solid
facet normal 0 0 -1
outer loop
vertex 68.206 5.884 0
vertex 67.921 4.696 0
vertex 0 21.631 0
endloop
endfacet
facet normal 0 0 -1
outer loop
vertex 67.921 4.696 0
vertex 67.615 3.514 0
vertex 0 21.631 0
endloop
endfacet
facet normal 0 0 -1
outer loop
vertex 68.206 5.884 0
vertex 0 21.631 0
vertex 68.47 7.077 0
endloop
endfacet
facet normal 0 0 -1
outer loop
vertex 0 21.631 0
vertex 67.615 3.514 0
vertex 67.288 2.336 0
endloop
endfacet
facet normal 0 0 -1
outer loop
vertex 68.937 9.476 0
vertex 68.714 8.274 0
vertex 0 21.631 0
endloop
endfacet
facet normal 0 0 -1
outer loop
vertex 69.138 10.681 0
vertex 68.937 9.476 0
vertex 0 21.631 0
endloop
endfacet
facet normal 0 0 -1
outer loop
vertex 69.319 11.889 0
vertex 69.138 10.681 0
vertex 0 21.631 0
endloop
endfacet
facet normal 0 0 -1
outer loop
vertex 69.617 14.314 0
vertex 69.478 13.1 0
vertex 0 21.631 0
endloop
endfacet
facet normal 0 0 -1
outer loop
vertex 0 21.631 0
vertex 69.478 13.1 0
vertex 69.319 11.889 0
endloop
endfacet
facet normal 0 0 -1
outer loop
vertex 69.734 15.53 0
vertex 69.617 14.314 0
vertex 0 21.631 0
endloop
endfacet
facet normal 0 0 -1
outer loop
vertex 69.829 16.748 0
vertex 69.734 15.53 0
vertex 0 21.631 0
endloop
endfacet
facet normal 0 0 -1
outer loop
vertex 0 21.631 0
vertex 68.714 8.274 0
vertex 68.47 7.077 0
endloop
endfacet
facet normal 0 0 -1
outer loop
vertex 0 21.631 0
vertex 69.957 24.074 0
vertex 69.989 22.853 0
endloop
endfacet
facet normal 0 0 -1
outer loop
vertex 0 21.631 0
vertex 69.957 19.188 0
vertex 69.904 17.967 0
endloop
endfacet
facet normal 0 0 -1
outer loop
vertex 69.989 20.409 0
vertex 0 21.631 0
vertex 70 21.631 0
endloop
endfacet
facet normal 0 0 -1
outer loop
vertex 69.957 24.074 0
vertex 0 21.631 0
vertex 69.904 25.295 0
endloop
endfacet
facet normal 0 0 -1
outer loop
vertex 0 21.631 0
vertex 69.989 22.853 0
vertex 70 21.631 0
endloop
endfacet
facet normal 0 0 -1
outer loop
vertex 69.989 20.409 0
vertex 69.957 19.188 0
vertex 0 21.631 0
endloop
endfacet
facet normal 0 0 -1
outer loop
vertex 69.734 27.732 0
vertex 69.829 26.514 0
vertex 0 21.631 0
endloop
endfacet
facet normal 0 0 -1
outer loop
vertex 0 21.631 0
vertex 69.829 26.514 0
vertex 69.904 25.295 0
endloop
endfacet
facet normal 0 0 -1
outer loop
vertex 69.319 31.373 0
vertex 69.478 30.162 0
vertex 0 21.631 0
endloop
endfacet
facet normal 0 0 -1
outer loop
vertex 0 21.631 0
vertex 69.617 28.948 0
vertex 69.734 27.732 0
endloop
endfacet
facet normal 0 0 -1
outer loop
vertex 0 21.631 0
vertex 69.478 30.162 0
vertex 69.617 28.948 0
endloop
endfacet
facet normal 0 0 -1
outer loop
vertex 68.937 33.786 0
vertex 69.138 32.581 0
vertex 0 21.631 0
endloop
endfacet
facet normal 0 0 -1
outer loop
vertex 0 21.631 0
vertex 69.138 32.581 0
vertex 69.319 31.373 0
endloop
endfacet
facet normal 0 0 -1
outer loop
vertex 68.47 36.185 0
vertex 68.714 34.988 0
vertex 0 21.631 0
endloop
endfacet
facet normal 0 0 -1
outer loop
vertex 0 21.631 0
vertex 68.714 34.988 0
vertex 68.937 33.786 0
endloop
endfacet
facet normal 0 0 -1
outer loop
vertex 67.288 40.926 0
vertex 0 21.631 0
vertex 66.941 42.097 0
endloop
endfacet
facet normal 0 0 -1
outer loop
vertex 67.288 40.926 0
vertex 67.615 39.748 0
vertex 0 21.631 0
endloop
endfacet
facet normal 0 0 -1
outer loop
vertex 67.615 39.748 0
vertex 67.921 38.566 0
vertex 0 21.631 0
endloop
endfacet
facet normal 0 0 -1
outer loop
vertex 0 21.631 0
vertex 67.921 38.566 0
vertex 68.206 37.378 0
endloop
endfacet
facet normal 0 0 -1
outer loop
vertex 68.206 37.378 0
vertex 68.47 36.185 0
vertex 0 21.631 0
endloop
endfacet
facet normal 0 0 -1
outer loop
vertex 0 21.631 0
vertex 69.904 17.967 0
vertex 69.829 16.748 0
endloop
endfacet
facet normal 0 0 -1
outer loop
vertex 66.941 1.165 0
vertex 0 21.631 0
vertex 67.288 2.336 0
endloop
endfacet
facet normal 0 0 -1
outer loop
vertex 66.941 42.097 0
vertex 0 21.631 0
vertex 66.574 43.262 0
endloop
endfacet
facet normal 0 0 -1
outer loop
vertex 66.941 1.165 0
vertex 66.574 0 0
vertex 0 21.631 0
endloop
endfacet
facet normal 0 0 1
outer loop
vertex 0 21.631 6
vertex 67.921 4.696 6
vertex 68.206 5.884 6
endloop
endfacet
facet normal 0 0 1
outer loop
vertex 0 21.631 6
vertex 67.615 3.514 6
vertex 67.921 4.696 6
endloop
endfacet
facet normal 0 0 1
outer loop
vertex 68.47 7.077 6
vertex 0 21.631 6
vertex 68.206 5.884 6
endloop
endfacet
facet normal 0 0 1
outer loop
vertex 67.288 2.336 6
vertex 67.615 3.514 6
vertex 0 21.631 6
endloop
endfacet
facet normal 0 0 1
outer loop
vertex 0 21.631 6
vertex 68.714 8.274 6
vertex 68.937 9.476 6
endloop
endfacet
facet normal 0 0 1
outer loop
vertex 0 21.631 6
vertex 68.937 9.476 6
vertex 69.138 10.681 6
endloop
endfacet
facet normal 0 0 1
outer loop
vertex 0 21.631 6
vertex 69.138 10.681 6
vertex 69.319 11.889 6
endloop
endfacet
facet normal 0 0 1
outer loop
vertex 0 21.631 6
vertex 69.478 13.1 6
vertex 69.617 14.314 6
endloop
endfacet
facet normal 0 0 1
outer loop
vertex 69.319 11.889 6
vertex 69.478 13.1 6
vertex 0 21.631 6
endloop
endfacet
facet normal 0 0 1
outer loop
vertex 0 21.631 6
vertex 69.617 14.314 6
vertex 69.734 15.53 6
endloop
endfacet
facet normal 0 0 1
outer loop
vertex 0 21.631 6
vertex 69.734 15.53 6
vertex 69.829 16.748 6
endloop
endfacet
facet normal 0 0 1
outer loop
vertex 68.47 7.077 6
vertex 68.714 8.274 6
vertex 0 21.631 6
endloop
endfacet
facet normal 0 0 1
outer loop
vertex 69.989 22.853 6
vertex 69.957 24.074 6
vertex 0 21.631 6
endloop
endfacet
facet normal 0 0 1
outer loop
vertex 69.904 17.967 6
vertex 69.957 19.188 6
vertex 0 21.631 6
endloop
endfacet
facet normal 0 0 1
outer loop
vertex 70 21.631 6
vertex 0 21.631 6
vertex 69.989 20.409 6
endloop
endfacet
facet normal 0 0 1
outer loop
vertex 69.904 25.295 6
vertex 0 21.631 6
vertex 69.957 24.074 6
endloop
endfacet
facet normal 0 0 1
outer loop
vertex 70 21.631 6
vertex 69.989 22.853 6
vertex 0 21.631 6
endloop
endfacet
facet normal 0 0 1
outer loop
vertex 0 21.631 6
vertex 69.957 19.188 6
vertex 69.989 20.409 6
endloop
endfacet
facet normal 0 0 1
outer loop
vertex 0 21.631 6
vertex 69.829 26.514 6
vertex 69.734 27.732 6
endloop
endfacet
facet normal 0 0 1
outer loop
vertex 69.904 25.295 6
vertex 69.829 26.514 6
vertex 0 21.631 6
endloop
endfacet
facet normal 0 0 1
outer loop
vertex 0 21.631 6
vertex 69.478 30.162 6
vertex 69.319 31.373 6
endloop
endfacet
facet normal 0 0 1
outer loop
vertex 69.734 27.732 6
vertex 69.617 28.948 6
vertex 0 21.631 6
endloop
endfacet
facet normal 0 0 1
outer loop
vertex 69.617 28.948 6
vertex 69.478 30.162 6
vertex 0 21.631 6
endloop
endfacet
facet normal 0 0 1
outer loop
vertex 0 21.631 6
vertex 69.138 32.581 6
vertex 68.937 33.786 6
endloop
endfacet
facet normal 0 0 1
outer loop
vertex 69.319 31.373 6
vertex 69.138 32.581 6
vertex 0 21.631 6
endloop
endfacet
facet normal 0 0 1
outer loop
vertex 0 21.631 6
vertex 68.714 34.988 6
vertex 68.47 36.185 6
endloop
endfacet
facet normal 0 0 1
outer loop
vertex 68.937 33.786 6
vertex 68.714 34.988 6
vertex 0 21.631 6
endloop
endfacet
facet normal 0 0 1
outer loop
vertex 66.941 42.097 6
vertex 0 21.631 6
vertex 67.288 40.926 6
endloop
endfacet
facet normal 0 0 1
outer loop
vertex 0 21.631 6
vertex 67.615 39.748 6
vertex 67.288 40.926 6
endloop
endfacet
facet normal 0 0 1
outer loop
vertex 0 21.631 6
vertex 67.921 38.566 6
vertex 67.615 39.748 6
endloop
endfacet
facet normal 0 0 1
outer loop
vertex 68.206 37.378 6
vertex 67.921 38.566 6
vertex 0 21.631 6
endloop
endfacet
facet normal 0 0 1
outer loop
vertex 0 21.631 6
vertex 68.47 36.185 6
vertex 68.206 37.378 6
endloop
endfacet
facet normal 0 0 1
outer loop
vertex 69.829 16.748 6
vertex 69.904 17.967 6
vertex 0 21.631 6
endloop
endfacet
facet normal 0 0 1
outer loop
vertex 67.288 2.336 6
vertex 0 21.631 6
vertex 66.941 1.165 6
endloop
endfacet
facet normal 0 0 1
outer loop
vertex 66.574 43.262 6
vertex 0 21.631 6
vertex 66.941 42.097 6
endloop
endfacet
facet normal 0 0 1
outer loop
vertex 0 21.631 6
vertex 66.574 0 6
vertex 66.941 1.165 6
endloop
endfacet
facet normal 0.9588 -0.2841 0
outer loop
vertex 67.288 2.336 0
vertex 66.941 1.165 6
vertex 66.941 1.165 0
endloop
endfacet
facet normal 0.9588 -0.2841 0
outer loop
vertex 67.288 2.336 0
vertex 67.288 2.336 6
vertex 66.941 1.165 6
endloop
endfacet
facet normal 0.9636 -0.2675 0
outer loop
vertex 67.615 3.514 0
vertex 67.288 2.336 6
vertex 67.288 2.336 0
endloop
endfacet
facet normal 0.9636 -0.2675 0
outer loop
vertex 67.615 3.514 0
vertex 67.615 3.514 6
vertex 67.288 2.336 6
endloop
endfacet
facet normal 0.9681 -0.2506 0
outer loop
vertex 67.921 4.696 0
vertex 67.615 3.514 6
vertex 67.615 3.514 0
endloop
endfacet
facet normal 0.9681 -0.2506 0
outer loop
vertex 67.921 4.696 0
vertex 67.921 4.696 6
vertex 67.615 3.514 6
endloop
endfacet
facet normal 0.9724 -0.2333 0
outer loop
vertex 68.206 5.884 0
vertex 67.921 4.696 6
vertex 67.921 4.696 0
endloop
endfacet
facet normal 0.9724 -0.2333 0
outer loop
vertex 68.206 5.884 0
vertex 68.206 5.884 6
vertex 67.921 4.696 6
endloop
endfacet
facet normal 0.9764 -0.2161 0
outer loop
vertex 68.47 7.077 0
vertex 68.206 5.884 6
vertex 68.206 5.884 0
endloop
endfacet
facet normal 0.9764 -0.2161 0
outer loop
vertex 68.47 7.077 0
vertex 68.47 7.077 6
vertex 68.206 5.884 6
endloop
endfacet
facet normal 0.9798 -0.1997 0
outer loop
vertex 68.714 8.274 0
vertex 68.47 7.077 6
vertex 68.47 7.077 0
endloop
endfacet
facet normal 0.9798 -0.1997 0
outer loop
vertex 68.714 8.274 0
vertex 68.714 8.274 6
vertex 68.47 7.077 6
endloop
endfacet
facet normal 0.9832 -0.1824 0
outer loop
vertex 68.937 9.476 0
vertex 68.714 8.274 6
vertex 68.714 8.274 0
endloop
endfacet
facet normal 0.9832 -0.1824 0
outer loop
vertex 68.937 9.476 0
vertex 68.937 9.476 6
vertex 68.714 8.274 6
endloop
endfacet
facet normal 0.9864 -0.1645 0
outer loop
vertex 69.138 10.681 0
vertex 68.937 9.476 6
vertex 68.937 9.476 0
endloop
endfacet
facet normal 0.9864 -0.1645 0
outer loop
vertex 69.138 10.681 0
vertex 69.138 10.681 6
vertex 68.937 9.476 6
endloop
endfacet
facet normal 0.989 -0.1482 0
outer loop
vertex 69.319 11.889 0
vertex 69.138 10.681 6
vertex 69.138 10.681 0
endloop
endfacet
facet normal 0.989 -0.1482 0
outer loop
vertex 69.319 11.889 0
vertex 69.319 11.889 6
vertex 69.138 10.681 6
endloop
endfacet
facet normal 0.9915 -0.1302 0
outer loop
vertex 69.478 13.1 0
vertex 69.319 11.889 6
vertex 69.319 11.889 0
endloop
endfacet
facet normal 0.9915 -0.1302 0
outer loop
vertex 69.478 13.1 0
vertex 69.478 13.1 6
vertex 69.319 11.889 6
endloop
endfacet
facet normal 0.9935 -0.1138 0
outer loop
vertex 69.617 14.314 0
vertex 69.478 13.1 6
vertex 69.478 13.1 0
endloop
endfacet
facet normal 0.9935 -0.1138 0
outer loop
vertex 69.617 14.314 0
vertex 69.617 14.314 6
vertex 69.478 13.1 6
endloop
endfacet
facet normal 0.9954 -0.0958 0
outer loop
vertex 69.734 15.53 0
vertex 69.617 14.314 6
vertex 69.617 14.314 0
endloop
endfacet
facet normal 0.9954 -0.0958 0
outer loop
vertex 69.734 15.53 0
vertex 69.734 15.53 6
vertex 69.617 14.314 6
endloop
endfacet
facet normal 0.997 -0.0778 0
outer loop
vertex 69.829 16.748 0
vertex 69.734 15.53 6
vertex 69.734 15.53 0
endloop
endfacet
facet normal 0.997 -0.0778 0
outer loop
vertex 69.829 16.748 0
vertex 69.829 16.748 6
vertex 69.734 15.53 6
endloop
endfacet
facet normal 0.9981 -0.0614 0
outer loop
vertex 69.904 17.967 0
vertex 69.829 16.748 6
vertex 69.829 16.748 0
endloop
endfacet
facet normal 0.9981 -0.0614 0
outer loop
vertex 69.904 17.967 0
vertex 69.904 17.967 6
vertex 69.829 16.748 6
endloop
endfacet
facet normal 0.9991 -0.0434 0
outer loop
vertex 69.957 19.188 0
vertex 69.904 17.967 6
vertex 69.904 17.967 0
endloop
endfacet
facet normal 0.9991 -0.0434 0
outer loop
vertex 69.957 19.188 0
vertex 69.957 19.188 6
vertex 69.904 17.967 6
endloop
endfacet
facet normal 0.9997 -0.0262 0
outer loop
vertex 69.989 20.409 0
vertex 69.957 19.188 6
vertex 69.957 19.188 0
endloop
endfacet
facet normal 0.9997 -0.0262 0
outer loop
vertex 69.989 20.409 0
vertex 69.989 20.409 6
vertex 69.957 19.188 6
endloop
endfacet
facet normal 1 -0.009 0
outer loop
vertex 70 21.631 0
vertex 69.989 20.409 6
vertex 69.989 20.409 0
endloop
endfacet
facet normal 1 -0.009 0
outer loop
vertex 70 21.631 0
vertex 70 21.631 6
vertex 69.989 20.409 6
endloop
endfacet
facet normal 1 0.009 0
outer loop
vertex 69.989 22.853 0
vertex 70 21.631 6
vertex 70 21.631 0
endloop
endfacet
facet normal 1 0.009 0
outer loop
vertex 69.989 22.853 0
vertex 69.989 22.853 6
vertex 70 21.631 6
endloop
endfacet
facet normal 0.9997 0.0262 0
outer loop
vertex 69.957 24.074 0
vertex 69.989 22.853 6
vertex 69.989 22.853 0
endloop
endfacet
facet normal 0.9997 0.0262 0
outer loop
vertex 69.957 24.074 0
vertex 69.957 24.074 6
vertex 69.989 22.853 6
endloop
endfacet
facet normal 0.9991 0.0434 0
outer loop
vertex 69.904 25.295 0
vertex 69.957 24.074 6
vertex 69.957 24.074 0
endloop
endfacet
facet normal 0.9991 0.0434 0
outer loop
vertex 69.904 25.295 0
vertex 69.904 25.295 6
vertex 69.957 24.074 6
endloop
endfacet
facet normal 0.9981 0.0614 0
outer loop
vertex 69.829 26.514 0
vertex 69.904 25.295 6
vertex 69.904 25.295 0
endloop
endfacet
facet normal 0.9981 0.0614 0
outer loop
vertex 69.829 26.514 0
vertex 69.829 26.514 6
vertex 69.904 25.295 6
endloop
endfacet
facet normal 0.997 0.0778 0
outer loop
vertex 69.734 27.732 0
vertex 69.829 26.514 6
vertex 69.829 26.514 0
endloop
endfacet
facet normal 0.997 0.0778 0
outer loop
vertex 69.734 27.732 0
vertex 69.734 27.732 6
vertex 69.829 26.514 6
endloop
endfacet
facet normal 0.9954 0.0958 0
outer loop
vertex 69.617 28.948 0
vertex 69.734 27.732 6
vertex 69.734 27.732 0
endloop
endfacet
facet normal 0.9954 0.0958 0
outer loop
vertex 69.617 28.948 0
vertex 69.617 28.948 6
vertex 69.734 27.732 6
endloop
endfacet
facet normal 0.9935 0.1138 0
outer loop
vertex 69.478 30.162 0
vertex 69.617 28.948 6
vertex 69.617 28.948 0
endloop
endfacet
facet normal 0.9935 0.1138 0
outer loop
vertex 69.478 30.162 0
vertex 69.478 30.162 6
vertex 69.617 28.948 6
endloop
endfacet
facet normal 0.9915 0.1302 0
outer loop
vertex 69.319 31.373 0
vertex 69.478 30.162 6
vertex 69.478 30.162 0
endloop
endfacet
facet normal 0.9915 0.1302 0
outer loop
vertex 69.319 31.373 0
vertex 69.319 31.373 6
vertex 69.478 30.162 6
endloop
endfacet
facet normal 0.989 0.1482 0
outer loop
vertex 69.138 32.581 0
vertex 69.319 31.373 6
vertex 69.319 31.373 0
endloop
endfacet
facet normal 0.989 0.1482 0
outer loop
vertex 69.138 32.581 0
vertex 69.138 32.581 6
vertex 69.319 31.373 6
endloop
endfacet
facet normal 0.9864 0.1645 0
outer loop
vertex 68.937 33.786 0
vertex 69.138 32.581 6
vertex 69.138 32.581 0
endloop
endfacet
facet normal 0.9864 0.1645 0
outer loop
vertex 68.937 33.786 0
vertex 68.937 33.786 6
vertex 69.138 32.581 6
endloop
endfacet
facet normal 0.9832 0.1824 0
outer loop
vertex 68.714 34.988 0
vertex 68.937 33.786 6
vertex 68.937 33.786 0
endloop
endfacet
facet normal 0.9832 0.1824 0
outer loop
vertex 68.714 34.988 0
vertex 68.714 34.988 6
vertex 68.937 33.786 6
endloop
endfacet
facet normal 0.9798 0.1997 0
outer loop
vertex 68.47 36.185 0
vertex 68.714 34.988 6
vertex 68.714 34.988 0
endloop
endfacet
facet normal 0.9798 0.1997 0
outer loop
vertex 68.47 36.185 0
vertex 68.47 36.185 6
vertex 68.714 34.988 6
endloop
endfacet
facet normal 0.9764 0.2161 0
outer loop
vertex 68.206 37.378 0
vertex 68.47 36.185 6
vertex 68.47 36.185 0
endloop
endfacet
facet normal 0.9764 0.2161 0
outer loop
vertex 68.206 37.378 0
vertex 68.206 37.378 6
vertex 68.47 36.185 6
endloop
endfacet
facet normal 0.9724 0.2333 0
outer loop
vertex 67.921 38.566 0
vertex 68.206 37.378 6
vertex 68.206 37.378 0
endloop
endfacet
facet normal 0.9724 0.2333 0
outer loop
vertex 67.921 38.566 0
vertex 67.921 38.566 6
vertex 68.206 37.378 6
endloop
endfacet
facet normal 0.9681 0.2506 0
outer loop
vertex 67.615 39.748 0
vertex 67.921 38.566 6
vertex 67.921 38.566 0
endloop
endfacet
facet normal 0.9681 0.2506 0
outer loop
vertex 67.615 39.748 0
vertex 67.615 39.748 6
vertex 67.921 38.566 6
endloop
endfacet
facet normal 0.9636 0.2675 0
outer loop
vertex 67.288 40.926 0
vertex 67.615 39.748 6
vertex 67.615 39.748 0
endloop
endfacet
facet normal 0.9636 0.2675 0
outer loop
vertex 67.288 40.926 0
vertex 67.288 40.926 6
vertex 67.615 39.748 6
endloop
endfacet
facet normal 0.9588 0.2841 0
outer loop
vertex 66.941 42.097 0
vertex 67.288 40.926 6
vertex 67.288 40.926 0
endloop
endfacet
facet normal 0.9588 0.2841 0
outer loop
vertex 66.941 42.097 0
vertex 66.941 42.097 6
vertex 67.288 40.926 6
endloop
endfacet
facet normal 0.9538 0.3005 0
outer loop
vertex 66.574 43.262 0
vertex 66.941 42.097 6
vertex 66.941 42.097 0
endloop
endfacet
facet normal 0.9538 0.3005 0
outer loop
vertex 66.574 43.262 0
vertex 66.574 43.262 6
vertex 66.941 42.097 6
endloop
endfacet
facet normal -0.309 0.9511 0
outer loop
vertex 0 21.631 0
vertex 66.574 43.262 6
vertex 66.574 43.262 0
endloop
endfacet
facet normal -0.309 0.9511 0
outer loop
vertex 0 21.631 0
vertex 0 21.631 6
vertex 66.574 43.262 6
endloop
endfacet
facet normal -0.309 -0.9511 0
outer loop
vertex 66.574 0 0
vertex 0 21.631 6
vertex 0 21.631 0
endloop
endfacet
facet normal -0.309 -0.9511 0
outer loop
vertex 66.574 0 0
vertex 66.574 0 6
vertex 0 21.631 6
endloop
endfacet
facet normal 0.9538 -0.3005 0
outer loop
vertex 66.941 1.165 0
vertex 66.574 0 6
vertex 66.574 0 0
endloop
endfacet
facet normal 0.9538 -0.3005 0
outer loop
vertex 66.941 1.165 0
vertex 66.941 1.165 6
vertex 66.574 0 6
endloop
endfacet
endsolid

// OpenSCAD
$fn = 32;

// ----------------------------------------------------------------------
// Arc profile plate: sector, 38 points
// ----------------------------------------------------------------------

// --- parameters (mm) ---
sector_angle = 36;        // sector angle, degrees
sector_r = 70;            // outer radius
arc_step = 1;             // sampling step of the arc, degrees
plate_t = 6;              // plate thickness, Z
fit_tol = 0.05;           // declared fit tolerance (prompt contract)
free_tol = 0.2;           // declared free tolerance (prompt contract)

bbox_x = 2 * sector_r * sin(sector_angle / 2);  // chord of the sector
bbox_y = sector_r;  // depth of the sector (apex to arc)

profile = [[66.574, 0], [66.941, 1.165], [67.288, 2.336], [67.615, 3.514], [67.921, 4.696], [68.206, 5.884], [68.47, 7.077], [68.714, 8.274], [68.937, 9.476], [69.138, 10.681], [69.319, 11.889], [69.478, 13.1], [69.617, 14.314], [69.734, 15.53], [69.829, 16.748], [69.904, 17.967], [69.957, 19.188], [69.989, 20.409], [70, 21.631], [69.989, 22.853], [69.957, 24.074], [69.904, 25.295], [69.829, 26.514], [69.734, 27.732], [69.617, 28.948], [69.478, 30.162], [69.319, 31.373], [69.138, 32.581], [68.937, 33.786], [68.714, 34.988], [68.47, 36.185], [68.206, 37.378], [67.921, 38.566], [67.615, 39.748], [67.288, 40.926], [66.941, 42.097], [66.574, 43.262], [0, 21.631]];  // primary outline, 38 points, counter clockwise

// --- the one profile operation ---
linear_extrude(height = plate_t) polygon(points = profile);
